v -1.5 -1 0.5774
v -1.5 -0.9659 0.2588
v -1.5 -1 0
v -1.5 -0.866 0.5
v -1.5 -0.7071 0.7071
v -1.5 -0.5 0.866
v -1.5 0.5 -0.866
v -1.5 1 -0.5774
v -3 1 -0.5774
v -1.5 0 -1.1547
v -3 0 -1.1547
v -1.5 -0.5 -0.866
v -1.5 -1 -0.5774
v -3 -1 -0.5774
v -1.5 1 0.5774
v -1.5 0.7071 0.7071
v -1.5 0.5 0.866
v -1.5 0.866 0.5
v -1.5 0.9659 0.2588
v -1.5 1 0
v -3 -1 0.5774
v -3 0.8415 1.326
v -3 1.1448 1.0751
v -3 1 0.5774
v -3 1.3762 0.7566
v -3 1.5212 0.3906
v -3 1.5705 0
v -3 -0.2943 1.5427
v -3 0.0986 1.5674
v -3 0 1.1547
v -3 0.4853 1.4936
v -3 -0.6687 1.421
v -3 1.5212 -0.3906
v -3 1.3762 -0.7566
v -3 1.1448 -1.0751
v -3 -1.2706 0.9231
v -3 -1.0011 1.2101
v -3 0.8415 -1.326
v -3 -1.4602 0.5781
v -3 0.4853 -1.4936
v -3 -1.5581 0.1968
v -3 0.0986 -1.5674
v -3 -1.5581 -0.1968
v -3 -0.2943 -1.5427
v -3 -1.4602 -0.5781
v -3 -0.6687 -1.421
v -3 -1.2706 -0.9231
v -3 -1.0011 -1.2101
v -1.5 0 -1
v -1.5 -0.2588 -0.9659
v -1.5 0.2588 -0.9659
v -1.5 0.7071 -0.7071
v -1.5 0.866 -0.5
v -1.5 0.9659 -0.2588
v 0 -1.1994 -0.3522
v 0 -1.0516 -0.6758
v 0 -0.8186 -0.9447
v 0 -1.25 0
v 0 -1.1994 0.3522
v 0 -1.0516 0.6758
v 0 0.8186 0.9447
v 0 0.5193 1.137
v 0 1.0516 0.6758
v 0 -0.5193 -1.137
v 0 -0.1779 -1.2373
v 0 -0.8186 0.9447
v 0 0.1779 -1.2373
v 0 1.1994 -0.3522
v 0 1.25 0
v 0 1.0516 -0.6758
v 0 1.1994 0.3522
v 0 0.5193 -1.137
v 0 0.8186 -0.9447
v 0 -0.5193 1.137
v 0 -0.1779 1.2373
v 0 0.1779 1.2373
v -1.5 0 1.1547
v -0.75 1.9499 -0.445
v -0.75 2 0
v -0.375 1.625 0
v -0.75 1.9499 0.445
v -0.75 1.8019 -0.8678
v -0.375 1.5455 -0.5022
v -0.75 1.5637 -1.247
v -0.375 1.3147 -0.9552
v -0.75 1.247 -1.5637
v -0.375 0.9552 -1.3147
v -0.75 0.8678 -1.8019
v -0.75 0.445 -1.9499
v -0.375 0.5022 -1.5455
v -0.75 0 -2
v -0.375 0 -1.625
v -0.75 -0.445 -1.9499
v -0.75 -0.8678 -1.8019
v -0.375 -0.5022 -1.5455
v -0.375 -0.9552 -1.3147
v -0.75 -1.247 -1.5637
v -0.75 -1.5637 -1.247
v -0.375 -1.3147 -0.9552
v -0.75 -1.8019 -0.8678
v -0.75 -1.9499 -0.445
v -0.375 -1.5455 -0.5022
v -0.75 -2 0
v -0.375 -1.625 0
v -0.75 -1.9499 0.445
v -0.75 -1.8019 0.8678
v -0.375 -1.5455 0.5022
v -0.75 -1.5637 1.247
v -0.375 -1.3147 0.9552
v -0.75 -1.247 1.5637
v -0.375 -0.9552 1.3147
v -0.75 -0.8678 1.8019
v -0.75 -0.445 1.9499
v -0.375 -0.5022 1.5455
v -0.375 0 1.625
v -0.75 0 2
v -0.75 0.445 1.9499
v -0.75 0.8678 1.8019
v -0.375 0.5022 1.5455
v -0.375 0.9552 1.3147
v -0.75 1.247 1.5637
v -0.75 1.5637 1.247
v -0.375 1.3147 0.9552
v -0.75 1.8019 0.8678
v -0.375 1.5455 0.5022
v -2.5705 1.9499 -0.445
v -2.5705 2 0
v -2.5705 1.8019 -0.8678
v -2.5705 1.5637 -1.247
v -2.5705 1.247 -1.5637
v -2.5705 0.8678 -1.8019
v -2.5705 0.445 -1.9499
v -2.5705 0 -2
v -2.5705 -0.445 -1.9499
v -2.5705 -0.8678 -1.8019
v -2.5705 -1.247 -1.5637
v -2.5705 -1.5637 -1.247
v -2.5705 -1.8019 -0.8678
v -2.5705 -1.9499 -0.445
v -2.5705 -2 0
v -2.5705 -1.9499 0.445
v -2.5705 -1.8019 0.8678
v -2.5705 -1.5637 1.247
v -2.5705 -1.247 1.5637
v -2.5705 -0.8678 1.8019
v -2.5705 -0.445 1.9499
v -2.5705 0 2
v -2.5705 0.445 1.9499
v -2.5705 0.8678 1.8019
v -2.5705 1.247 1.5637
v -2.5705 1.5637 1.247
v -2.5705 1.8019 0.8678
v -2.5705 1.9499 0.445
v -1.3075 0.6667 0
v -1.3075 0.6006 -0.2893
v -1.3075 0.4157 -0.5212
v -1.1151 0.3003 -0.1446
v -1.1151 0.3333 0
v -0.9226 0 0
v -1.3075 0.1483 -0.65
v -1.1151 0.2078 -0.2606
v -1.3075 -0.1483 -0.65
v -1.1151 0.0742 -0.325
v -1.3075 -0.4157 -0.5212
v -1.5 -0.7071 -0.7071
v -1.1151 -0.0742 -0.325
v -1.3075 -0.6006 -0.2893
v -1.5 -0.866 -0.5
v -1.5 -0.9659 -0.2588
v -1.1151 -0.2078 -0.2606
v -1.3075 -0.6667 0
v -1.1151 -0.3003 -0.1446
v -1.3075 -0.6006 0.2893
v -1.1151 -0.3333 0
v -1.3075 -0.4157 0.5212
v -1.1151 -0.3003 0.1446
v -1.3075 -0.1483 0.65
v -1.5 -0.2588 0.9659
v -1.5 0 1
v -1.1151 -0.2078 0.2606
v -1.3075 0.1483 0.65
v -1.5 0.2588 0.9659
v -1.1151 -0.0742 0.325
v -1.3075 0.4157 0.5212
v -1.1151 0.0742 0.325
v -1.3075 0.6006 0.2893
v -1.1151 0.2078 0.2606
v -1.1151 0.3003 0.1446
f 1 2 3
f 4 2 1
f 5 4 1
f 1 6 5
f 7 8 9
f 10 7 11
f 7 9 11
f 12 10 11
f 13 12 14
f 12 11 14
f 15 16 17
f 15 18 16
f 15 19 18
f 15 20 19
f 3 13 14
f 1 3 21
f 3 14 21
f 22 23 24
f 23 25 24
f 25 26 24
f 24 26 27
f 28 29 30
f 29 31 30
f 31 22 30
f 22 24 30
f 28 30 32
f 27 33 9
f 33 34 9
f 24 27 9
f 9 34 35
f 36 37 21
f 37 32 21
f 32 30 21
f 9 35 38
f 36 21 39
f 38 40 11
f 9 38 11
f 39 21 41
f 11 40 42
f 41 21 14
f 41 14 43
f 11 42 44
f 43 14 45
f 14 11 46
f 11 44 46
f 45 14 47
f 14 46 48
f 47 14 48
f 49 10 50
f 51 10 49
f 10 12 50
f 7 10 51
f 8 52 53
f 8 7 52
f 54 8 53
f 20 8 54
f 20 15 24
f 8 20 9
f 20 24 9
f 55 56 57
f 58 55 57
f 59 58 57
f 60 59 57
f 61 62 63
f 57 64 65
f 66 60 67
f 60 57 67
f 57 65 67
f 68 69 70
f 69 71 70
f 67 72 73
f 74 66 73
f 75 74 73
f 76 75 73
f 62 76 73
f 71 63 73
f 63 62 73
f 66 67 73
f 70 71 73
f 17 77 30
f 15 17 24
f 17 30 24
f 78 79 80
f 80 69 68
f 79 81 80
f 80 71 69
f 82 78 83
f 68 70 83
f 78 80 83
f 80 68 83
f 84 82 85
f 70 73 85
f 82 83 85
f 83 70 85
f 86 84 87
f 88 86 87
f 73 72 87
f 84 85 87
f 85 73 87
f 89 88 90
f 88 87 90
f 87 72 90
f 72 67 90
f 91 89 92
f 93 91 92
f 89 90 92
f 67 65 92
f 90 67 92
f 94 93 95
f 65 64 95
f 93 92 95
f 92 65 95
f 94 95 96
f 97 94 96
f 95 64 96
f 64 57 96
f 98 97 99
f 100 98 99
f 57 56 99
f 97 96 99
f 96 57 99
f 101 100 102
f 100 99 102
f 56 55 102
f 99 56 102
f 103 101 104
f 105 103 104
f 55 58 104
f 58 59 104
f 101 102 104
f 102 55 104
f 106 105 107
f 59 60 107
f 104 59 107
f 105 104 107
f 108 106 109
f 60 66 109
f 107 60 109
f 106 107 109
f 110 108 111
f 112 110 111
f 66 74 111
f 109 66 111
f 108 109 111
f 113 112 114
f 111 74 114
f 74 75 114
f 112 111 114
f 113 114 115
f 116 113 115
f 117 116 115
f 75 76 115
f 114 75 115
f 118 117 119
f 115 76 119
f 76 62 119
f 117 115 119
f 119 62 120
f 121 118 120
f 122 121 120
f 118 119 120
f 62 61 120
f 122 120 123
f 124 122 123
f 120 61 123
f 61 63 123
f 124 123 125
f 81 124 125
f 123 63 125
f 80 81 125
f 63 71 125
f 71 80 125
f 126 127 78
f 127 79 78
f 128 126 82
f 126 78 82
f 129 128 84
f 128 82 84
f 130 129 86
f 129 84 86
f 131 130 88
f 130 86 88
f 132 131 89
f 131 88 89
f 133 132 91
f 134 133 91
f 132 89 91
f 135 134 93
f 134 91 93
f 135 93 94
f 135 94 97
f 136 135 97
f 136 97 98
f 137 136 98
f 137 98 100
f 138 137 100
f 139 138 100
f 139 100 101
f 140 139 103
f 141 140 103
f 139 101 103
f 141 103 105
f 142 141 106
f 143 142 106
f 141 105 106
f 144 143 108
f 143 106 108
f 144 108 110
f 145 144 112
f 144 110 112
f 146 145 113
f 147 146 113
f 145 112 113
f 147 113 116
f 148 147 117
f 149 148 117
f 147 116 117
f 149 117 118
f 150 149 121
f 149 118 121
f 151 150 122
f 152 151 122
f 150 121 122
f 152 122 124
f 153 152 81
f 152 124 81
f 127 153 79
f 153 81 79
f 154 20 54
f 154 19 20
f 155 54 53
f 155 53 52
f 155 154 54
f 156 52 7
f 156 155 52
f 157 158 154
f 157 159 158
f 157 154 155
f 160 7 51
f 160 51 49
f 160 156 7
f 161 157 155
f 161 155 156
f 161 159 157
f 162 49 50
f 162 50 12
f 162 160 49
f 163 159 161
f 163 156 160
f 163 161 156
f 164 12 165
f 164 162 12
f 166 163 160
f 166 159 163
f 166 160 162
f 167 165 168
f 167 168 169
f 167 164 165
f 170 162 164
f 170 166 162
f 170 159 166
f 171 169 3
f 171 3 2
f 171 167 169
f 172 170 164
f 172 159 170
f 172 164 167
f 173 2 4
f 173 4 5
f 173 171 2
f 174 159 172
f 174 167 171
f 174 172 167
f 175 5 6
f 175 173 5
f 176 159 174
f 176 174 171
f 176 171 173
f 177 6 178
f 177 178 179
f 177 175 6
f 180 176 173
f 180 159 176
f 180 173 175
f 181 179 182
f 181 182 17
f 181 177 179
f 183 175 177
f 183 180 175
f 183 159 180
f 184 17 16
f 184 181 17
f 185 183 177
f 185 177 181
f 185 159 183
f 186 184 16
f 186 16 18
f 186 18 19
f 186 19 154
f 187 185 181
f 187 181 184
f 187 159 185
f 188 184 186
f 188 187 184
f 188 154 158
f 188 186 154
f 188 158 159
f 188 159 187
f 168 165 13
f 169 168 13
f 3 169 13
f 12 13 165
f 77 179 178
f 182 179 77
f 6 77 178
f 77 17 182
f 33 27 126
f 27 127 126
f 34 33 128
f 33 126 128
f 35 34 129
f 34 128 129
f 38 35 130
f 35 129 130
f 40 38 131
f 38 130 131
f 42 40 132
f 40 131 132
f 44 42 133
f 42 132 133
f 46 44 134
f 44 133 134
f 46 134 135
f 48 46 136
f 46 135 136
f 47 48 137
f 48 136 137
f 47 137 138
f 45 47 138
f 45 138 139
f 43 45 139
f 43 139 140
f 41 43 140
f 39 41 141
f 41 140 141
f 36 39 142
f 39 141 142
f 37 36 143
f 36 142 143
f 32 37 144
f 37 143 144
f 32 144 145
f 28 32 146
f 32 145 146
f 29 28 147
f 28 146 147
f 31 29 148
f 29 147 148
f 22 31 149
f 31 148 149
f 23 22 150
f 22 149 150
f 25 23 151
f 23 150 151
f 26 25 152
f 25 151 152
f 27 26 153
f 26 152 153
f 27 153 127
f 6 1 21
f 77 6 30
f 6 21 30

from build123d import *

# Parameters (mm, degrees)
CUT_EXTRUDE_1_DEPTH = 1.5


with BuildPart() as part:
    # ｽｹｯﾁ1 → 回転1 (revolve)
    with BuildSketch(Plane.XY):
        Polygon((-3, 0), (-3, 1.5705), (-2.5705, 2), (-0.75, 2), (0, 1.25), (0, 0), align=None)
    revolve(axis=Axis((0, 0, 0), (-1, 0, 0)))

    # ｽｹｯﾁ2 → ｶｯﾄ - 押し出し1 (cut)
    with BuildSketch(Plane.ZY.offset(3)):
        Polygon((0.577350269, -1), (1.154700538, 0), (0.577350269, 1), (-0.577350269, 1), (-1.154700538, 0), (-0.577350269, -1), align=None)
    extrude(amount=-CUT_EXTRUDE_1_DEPTH, mode=Mode.SUBTRACT)

    # ｽｹｯﾁ3 → ｶｯﾄ - 回転1 (revolve, cut)
    with BuildSketch(Plane.XY):
        Polygon((-1.5, 0), (-1.5, 1), (-0.922649731, 0), align=None)
    revolve(axis=Axis((-0.922649731, 0, 0), (-1, 0, 0)), mode=Mode.SUBTRACT)


solid = part.part
